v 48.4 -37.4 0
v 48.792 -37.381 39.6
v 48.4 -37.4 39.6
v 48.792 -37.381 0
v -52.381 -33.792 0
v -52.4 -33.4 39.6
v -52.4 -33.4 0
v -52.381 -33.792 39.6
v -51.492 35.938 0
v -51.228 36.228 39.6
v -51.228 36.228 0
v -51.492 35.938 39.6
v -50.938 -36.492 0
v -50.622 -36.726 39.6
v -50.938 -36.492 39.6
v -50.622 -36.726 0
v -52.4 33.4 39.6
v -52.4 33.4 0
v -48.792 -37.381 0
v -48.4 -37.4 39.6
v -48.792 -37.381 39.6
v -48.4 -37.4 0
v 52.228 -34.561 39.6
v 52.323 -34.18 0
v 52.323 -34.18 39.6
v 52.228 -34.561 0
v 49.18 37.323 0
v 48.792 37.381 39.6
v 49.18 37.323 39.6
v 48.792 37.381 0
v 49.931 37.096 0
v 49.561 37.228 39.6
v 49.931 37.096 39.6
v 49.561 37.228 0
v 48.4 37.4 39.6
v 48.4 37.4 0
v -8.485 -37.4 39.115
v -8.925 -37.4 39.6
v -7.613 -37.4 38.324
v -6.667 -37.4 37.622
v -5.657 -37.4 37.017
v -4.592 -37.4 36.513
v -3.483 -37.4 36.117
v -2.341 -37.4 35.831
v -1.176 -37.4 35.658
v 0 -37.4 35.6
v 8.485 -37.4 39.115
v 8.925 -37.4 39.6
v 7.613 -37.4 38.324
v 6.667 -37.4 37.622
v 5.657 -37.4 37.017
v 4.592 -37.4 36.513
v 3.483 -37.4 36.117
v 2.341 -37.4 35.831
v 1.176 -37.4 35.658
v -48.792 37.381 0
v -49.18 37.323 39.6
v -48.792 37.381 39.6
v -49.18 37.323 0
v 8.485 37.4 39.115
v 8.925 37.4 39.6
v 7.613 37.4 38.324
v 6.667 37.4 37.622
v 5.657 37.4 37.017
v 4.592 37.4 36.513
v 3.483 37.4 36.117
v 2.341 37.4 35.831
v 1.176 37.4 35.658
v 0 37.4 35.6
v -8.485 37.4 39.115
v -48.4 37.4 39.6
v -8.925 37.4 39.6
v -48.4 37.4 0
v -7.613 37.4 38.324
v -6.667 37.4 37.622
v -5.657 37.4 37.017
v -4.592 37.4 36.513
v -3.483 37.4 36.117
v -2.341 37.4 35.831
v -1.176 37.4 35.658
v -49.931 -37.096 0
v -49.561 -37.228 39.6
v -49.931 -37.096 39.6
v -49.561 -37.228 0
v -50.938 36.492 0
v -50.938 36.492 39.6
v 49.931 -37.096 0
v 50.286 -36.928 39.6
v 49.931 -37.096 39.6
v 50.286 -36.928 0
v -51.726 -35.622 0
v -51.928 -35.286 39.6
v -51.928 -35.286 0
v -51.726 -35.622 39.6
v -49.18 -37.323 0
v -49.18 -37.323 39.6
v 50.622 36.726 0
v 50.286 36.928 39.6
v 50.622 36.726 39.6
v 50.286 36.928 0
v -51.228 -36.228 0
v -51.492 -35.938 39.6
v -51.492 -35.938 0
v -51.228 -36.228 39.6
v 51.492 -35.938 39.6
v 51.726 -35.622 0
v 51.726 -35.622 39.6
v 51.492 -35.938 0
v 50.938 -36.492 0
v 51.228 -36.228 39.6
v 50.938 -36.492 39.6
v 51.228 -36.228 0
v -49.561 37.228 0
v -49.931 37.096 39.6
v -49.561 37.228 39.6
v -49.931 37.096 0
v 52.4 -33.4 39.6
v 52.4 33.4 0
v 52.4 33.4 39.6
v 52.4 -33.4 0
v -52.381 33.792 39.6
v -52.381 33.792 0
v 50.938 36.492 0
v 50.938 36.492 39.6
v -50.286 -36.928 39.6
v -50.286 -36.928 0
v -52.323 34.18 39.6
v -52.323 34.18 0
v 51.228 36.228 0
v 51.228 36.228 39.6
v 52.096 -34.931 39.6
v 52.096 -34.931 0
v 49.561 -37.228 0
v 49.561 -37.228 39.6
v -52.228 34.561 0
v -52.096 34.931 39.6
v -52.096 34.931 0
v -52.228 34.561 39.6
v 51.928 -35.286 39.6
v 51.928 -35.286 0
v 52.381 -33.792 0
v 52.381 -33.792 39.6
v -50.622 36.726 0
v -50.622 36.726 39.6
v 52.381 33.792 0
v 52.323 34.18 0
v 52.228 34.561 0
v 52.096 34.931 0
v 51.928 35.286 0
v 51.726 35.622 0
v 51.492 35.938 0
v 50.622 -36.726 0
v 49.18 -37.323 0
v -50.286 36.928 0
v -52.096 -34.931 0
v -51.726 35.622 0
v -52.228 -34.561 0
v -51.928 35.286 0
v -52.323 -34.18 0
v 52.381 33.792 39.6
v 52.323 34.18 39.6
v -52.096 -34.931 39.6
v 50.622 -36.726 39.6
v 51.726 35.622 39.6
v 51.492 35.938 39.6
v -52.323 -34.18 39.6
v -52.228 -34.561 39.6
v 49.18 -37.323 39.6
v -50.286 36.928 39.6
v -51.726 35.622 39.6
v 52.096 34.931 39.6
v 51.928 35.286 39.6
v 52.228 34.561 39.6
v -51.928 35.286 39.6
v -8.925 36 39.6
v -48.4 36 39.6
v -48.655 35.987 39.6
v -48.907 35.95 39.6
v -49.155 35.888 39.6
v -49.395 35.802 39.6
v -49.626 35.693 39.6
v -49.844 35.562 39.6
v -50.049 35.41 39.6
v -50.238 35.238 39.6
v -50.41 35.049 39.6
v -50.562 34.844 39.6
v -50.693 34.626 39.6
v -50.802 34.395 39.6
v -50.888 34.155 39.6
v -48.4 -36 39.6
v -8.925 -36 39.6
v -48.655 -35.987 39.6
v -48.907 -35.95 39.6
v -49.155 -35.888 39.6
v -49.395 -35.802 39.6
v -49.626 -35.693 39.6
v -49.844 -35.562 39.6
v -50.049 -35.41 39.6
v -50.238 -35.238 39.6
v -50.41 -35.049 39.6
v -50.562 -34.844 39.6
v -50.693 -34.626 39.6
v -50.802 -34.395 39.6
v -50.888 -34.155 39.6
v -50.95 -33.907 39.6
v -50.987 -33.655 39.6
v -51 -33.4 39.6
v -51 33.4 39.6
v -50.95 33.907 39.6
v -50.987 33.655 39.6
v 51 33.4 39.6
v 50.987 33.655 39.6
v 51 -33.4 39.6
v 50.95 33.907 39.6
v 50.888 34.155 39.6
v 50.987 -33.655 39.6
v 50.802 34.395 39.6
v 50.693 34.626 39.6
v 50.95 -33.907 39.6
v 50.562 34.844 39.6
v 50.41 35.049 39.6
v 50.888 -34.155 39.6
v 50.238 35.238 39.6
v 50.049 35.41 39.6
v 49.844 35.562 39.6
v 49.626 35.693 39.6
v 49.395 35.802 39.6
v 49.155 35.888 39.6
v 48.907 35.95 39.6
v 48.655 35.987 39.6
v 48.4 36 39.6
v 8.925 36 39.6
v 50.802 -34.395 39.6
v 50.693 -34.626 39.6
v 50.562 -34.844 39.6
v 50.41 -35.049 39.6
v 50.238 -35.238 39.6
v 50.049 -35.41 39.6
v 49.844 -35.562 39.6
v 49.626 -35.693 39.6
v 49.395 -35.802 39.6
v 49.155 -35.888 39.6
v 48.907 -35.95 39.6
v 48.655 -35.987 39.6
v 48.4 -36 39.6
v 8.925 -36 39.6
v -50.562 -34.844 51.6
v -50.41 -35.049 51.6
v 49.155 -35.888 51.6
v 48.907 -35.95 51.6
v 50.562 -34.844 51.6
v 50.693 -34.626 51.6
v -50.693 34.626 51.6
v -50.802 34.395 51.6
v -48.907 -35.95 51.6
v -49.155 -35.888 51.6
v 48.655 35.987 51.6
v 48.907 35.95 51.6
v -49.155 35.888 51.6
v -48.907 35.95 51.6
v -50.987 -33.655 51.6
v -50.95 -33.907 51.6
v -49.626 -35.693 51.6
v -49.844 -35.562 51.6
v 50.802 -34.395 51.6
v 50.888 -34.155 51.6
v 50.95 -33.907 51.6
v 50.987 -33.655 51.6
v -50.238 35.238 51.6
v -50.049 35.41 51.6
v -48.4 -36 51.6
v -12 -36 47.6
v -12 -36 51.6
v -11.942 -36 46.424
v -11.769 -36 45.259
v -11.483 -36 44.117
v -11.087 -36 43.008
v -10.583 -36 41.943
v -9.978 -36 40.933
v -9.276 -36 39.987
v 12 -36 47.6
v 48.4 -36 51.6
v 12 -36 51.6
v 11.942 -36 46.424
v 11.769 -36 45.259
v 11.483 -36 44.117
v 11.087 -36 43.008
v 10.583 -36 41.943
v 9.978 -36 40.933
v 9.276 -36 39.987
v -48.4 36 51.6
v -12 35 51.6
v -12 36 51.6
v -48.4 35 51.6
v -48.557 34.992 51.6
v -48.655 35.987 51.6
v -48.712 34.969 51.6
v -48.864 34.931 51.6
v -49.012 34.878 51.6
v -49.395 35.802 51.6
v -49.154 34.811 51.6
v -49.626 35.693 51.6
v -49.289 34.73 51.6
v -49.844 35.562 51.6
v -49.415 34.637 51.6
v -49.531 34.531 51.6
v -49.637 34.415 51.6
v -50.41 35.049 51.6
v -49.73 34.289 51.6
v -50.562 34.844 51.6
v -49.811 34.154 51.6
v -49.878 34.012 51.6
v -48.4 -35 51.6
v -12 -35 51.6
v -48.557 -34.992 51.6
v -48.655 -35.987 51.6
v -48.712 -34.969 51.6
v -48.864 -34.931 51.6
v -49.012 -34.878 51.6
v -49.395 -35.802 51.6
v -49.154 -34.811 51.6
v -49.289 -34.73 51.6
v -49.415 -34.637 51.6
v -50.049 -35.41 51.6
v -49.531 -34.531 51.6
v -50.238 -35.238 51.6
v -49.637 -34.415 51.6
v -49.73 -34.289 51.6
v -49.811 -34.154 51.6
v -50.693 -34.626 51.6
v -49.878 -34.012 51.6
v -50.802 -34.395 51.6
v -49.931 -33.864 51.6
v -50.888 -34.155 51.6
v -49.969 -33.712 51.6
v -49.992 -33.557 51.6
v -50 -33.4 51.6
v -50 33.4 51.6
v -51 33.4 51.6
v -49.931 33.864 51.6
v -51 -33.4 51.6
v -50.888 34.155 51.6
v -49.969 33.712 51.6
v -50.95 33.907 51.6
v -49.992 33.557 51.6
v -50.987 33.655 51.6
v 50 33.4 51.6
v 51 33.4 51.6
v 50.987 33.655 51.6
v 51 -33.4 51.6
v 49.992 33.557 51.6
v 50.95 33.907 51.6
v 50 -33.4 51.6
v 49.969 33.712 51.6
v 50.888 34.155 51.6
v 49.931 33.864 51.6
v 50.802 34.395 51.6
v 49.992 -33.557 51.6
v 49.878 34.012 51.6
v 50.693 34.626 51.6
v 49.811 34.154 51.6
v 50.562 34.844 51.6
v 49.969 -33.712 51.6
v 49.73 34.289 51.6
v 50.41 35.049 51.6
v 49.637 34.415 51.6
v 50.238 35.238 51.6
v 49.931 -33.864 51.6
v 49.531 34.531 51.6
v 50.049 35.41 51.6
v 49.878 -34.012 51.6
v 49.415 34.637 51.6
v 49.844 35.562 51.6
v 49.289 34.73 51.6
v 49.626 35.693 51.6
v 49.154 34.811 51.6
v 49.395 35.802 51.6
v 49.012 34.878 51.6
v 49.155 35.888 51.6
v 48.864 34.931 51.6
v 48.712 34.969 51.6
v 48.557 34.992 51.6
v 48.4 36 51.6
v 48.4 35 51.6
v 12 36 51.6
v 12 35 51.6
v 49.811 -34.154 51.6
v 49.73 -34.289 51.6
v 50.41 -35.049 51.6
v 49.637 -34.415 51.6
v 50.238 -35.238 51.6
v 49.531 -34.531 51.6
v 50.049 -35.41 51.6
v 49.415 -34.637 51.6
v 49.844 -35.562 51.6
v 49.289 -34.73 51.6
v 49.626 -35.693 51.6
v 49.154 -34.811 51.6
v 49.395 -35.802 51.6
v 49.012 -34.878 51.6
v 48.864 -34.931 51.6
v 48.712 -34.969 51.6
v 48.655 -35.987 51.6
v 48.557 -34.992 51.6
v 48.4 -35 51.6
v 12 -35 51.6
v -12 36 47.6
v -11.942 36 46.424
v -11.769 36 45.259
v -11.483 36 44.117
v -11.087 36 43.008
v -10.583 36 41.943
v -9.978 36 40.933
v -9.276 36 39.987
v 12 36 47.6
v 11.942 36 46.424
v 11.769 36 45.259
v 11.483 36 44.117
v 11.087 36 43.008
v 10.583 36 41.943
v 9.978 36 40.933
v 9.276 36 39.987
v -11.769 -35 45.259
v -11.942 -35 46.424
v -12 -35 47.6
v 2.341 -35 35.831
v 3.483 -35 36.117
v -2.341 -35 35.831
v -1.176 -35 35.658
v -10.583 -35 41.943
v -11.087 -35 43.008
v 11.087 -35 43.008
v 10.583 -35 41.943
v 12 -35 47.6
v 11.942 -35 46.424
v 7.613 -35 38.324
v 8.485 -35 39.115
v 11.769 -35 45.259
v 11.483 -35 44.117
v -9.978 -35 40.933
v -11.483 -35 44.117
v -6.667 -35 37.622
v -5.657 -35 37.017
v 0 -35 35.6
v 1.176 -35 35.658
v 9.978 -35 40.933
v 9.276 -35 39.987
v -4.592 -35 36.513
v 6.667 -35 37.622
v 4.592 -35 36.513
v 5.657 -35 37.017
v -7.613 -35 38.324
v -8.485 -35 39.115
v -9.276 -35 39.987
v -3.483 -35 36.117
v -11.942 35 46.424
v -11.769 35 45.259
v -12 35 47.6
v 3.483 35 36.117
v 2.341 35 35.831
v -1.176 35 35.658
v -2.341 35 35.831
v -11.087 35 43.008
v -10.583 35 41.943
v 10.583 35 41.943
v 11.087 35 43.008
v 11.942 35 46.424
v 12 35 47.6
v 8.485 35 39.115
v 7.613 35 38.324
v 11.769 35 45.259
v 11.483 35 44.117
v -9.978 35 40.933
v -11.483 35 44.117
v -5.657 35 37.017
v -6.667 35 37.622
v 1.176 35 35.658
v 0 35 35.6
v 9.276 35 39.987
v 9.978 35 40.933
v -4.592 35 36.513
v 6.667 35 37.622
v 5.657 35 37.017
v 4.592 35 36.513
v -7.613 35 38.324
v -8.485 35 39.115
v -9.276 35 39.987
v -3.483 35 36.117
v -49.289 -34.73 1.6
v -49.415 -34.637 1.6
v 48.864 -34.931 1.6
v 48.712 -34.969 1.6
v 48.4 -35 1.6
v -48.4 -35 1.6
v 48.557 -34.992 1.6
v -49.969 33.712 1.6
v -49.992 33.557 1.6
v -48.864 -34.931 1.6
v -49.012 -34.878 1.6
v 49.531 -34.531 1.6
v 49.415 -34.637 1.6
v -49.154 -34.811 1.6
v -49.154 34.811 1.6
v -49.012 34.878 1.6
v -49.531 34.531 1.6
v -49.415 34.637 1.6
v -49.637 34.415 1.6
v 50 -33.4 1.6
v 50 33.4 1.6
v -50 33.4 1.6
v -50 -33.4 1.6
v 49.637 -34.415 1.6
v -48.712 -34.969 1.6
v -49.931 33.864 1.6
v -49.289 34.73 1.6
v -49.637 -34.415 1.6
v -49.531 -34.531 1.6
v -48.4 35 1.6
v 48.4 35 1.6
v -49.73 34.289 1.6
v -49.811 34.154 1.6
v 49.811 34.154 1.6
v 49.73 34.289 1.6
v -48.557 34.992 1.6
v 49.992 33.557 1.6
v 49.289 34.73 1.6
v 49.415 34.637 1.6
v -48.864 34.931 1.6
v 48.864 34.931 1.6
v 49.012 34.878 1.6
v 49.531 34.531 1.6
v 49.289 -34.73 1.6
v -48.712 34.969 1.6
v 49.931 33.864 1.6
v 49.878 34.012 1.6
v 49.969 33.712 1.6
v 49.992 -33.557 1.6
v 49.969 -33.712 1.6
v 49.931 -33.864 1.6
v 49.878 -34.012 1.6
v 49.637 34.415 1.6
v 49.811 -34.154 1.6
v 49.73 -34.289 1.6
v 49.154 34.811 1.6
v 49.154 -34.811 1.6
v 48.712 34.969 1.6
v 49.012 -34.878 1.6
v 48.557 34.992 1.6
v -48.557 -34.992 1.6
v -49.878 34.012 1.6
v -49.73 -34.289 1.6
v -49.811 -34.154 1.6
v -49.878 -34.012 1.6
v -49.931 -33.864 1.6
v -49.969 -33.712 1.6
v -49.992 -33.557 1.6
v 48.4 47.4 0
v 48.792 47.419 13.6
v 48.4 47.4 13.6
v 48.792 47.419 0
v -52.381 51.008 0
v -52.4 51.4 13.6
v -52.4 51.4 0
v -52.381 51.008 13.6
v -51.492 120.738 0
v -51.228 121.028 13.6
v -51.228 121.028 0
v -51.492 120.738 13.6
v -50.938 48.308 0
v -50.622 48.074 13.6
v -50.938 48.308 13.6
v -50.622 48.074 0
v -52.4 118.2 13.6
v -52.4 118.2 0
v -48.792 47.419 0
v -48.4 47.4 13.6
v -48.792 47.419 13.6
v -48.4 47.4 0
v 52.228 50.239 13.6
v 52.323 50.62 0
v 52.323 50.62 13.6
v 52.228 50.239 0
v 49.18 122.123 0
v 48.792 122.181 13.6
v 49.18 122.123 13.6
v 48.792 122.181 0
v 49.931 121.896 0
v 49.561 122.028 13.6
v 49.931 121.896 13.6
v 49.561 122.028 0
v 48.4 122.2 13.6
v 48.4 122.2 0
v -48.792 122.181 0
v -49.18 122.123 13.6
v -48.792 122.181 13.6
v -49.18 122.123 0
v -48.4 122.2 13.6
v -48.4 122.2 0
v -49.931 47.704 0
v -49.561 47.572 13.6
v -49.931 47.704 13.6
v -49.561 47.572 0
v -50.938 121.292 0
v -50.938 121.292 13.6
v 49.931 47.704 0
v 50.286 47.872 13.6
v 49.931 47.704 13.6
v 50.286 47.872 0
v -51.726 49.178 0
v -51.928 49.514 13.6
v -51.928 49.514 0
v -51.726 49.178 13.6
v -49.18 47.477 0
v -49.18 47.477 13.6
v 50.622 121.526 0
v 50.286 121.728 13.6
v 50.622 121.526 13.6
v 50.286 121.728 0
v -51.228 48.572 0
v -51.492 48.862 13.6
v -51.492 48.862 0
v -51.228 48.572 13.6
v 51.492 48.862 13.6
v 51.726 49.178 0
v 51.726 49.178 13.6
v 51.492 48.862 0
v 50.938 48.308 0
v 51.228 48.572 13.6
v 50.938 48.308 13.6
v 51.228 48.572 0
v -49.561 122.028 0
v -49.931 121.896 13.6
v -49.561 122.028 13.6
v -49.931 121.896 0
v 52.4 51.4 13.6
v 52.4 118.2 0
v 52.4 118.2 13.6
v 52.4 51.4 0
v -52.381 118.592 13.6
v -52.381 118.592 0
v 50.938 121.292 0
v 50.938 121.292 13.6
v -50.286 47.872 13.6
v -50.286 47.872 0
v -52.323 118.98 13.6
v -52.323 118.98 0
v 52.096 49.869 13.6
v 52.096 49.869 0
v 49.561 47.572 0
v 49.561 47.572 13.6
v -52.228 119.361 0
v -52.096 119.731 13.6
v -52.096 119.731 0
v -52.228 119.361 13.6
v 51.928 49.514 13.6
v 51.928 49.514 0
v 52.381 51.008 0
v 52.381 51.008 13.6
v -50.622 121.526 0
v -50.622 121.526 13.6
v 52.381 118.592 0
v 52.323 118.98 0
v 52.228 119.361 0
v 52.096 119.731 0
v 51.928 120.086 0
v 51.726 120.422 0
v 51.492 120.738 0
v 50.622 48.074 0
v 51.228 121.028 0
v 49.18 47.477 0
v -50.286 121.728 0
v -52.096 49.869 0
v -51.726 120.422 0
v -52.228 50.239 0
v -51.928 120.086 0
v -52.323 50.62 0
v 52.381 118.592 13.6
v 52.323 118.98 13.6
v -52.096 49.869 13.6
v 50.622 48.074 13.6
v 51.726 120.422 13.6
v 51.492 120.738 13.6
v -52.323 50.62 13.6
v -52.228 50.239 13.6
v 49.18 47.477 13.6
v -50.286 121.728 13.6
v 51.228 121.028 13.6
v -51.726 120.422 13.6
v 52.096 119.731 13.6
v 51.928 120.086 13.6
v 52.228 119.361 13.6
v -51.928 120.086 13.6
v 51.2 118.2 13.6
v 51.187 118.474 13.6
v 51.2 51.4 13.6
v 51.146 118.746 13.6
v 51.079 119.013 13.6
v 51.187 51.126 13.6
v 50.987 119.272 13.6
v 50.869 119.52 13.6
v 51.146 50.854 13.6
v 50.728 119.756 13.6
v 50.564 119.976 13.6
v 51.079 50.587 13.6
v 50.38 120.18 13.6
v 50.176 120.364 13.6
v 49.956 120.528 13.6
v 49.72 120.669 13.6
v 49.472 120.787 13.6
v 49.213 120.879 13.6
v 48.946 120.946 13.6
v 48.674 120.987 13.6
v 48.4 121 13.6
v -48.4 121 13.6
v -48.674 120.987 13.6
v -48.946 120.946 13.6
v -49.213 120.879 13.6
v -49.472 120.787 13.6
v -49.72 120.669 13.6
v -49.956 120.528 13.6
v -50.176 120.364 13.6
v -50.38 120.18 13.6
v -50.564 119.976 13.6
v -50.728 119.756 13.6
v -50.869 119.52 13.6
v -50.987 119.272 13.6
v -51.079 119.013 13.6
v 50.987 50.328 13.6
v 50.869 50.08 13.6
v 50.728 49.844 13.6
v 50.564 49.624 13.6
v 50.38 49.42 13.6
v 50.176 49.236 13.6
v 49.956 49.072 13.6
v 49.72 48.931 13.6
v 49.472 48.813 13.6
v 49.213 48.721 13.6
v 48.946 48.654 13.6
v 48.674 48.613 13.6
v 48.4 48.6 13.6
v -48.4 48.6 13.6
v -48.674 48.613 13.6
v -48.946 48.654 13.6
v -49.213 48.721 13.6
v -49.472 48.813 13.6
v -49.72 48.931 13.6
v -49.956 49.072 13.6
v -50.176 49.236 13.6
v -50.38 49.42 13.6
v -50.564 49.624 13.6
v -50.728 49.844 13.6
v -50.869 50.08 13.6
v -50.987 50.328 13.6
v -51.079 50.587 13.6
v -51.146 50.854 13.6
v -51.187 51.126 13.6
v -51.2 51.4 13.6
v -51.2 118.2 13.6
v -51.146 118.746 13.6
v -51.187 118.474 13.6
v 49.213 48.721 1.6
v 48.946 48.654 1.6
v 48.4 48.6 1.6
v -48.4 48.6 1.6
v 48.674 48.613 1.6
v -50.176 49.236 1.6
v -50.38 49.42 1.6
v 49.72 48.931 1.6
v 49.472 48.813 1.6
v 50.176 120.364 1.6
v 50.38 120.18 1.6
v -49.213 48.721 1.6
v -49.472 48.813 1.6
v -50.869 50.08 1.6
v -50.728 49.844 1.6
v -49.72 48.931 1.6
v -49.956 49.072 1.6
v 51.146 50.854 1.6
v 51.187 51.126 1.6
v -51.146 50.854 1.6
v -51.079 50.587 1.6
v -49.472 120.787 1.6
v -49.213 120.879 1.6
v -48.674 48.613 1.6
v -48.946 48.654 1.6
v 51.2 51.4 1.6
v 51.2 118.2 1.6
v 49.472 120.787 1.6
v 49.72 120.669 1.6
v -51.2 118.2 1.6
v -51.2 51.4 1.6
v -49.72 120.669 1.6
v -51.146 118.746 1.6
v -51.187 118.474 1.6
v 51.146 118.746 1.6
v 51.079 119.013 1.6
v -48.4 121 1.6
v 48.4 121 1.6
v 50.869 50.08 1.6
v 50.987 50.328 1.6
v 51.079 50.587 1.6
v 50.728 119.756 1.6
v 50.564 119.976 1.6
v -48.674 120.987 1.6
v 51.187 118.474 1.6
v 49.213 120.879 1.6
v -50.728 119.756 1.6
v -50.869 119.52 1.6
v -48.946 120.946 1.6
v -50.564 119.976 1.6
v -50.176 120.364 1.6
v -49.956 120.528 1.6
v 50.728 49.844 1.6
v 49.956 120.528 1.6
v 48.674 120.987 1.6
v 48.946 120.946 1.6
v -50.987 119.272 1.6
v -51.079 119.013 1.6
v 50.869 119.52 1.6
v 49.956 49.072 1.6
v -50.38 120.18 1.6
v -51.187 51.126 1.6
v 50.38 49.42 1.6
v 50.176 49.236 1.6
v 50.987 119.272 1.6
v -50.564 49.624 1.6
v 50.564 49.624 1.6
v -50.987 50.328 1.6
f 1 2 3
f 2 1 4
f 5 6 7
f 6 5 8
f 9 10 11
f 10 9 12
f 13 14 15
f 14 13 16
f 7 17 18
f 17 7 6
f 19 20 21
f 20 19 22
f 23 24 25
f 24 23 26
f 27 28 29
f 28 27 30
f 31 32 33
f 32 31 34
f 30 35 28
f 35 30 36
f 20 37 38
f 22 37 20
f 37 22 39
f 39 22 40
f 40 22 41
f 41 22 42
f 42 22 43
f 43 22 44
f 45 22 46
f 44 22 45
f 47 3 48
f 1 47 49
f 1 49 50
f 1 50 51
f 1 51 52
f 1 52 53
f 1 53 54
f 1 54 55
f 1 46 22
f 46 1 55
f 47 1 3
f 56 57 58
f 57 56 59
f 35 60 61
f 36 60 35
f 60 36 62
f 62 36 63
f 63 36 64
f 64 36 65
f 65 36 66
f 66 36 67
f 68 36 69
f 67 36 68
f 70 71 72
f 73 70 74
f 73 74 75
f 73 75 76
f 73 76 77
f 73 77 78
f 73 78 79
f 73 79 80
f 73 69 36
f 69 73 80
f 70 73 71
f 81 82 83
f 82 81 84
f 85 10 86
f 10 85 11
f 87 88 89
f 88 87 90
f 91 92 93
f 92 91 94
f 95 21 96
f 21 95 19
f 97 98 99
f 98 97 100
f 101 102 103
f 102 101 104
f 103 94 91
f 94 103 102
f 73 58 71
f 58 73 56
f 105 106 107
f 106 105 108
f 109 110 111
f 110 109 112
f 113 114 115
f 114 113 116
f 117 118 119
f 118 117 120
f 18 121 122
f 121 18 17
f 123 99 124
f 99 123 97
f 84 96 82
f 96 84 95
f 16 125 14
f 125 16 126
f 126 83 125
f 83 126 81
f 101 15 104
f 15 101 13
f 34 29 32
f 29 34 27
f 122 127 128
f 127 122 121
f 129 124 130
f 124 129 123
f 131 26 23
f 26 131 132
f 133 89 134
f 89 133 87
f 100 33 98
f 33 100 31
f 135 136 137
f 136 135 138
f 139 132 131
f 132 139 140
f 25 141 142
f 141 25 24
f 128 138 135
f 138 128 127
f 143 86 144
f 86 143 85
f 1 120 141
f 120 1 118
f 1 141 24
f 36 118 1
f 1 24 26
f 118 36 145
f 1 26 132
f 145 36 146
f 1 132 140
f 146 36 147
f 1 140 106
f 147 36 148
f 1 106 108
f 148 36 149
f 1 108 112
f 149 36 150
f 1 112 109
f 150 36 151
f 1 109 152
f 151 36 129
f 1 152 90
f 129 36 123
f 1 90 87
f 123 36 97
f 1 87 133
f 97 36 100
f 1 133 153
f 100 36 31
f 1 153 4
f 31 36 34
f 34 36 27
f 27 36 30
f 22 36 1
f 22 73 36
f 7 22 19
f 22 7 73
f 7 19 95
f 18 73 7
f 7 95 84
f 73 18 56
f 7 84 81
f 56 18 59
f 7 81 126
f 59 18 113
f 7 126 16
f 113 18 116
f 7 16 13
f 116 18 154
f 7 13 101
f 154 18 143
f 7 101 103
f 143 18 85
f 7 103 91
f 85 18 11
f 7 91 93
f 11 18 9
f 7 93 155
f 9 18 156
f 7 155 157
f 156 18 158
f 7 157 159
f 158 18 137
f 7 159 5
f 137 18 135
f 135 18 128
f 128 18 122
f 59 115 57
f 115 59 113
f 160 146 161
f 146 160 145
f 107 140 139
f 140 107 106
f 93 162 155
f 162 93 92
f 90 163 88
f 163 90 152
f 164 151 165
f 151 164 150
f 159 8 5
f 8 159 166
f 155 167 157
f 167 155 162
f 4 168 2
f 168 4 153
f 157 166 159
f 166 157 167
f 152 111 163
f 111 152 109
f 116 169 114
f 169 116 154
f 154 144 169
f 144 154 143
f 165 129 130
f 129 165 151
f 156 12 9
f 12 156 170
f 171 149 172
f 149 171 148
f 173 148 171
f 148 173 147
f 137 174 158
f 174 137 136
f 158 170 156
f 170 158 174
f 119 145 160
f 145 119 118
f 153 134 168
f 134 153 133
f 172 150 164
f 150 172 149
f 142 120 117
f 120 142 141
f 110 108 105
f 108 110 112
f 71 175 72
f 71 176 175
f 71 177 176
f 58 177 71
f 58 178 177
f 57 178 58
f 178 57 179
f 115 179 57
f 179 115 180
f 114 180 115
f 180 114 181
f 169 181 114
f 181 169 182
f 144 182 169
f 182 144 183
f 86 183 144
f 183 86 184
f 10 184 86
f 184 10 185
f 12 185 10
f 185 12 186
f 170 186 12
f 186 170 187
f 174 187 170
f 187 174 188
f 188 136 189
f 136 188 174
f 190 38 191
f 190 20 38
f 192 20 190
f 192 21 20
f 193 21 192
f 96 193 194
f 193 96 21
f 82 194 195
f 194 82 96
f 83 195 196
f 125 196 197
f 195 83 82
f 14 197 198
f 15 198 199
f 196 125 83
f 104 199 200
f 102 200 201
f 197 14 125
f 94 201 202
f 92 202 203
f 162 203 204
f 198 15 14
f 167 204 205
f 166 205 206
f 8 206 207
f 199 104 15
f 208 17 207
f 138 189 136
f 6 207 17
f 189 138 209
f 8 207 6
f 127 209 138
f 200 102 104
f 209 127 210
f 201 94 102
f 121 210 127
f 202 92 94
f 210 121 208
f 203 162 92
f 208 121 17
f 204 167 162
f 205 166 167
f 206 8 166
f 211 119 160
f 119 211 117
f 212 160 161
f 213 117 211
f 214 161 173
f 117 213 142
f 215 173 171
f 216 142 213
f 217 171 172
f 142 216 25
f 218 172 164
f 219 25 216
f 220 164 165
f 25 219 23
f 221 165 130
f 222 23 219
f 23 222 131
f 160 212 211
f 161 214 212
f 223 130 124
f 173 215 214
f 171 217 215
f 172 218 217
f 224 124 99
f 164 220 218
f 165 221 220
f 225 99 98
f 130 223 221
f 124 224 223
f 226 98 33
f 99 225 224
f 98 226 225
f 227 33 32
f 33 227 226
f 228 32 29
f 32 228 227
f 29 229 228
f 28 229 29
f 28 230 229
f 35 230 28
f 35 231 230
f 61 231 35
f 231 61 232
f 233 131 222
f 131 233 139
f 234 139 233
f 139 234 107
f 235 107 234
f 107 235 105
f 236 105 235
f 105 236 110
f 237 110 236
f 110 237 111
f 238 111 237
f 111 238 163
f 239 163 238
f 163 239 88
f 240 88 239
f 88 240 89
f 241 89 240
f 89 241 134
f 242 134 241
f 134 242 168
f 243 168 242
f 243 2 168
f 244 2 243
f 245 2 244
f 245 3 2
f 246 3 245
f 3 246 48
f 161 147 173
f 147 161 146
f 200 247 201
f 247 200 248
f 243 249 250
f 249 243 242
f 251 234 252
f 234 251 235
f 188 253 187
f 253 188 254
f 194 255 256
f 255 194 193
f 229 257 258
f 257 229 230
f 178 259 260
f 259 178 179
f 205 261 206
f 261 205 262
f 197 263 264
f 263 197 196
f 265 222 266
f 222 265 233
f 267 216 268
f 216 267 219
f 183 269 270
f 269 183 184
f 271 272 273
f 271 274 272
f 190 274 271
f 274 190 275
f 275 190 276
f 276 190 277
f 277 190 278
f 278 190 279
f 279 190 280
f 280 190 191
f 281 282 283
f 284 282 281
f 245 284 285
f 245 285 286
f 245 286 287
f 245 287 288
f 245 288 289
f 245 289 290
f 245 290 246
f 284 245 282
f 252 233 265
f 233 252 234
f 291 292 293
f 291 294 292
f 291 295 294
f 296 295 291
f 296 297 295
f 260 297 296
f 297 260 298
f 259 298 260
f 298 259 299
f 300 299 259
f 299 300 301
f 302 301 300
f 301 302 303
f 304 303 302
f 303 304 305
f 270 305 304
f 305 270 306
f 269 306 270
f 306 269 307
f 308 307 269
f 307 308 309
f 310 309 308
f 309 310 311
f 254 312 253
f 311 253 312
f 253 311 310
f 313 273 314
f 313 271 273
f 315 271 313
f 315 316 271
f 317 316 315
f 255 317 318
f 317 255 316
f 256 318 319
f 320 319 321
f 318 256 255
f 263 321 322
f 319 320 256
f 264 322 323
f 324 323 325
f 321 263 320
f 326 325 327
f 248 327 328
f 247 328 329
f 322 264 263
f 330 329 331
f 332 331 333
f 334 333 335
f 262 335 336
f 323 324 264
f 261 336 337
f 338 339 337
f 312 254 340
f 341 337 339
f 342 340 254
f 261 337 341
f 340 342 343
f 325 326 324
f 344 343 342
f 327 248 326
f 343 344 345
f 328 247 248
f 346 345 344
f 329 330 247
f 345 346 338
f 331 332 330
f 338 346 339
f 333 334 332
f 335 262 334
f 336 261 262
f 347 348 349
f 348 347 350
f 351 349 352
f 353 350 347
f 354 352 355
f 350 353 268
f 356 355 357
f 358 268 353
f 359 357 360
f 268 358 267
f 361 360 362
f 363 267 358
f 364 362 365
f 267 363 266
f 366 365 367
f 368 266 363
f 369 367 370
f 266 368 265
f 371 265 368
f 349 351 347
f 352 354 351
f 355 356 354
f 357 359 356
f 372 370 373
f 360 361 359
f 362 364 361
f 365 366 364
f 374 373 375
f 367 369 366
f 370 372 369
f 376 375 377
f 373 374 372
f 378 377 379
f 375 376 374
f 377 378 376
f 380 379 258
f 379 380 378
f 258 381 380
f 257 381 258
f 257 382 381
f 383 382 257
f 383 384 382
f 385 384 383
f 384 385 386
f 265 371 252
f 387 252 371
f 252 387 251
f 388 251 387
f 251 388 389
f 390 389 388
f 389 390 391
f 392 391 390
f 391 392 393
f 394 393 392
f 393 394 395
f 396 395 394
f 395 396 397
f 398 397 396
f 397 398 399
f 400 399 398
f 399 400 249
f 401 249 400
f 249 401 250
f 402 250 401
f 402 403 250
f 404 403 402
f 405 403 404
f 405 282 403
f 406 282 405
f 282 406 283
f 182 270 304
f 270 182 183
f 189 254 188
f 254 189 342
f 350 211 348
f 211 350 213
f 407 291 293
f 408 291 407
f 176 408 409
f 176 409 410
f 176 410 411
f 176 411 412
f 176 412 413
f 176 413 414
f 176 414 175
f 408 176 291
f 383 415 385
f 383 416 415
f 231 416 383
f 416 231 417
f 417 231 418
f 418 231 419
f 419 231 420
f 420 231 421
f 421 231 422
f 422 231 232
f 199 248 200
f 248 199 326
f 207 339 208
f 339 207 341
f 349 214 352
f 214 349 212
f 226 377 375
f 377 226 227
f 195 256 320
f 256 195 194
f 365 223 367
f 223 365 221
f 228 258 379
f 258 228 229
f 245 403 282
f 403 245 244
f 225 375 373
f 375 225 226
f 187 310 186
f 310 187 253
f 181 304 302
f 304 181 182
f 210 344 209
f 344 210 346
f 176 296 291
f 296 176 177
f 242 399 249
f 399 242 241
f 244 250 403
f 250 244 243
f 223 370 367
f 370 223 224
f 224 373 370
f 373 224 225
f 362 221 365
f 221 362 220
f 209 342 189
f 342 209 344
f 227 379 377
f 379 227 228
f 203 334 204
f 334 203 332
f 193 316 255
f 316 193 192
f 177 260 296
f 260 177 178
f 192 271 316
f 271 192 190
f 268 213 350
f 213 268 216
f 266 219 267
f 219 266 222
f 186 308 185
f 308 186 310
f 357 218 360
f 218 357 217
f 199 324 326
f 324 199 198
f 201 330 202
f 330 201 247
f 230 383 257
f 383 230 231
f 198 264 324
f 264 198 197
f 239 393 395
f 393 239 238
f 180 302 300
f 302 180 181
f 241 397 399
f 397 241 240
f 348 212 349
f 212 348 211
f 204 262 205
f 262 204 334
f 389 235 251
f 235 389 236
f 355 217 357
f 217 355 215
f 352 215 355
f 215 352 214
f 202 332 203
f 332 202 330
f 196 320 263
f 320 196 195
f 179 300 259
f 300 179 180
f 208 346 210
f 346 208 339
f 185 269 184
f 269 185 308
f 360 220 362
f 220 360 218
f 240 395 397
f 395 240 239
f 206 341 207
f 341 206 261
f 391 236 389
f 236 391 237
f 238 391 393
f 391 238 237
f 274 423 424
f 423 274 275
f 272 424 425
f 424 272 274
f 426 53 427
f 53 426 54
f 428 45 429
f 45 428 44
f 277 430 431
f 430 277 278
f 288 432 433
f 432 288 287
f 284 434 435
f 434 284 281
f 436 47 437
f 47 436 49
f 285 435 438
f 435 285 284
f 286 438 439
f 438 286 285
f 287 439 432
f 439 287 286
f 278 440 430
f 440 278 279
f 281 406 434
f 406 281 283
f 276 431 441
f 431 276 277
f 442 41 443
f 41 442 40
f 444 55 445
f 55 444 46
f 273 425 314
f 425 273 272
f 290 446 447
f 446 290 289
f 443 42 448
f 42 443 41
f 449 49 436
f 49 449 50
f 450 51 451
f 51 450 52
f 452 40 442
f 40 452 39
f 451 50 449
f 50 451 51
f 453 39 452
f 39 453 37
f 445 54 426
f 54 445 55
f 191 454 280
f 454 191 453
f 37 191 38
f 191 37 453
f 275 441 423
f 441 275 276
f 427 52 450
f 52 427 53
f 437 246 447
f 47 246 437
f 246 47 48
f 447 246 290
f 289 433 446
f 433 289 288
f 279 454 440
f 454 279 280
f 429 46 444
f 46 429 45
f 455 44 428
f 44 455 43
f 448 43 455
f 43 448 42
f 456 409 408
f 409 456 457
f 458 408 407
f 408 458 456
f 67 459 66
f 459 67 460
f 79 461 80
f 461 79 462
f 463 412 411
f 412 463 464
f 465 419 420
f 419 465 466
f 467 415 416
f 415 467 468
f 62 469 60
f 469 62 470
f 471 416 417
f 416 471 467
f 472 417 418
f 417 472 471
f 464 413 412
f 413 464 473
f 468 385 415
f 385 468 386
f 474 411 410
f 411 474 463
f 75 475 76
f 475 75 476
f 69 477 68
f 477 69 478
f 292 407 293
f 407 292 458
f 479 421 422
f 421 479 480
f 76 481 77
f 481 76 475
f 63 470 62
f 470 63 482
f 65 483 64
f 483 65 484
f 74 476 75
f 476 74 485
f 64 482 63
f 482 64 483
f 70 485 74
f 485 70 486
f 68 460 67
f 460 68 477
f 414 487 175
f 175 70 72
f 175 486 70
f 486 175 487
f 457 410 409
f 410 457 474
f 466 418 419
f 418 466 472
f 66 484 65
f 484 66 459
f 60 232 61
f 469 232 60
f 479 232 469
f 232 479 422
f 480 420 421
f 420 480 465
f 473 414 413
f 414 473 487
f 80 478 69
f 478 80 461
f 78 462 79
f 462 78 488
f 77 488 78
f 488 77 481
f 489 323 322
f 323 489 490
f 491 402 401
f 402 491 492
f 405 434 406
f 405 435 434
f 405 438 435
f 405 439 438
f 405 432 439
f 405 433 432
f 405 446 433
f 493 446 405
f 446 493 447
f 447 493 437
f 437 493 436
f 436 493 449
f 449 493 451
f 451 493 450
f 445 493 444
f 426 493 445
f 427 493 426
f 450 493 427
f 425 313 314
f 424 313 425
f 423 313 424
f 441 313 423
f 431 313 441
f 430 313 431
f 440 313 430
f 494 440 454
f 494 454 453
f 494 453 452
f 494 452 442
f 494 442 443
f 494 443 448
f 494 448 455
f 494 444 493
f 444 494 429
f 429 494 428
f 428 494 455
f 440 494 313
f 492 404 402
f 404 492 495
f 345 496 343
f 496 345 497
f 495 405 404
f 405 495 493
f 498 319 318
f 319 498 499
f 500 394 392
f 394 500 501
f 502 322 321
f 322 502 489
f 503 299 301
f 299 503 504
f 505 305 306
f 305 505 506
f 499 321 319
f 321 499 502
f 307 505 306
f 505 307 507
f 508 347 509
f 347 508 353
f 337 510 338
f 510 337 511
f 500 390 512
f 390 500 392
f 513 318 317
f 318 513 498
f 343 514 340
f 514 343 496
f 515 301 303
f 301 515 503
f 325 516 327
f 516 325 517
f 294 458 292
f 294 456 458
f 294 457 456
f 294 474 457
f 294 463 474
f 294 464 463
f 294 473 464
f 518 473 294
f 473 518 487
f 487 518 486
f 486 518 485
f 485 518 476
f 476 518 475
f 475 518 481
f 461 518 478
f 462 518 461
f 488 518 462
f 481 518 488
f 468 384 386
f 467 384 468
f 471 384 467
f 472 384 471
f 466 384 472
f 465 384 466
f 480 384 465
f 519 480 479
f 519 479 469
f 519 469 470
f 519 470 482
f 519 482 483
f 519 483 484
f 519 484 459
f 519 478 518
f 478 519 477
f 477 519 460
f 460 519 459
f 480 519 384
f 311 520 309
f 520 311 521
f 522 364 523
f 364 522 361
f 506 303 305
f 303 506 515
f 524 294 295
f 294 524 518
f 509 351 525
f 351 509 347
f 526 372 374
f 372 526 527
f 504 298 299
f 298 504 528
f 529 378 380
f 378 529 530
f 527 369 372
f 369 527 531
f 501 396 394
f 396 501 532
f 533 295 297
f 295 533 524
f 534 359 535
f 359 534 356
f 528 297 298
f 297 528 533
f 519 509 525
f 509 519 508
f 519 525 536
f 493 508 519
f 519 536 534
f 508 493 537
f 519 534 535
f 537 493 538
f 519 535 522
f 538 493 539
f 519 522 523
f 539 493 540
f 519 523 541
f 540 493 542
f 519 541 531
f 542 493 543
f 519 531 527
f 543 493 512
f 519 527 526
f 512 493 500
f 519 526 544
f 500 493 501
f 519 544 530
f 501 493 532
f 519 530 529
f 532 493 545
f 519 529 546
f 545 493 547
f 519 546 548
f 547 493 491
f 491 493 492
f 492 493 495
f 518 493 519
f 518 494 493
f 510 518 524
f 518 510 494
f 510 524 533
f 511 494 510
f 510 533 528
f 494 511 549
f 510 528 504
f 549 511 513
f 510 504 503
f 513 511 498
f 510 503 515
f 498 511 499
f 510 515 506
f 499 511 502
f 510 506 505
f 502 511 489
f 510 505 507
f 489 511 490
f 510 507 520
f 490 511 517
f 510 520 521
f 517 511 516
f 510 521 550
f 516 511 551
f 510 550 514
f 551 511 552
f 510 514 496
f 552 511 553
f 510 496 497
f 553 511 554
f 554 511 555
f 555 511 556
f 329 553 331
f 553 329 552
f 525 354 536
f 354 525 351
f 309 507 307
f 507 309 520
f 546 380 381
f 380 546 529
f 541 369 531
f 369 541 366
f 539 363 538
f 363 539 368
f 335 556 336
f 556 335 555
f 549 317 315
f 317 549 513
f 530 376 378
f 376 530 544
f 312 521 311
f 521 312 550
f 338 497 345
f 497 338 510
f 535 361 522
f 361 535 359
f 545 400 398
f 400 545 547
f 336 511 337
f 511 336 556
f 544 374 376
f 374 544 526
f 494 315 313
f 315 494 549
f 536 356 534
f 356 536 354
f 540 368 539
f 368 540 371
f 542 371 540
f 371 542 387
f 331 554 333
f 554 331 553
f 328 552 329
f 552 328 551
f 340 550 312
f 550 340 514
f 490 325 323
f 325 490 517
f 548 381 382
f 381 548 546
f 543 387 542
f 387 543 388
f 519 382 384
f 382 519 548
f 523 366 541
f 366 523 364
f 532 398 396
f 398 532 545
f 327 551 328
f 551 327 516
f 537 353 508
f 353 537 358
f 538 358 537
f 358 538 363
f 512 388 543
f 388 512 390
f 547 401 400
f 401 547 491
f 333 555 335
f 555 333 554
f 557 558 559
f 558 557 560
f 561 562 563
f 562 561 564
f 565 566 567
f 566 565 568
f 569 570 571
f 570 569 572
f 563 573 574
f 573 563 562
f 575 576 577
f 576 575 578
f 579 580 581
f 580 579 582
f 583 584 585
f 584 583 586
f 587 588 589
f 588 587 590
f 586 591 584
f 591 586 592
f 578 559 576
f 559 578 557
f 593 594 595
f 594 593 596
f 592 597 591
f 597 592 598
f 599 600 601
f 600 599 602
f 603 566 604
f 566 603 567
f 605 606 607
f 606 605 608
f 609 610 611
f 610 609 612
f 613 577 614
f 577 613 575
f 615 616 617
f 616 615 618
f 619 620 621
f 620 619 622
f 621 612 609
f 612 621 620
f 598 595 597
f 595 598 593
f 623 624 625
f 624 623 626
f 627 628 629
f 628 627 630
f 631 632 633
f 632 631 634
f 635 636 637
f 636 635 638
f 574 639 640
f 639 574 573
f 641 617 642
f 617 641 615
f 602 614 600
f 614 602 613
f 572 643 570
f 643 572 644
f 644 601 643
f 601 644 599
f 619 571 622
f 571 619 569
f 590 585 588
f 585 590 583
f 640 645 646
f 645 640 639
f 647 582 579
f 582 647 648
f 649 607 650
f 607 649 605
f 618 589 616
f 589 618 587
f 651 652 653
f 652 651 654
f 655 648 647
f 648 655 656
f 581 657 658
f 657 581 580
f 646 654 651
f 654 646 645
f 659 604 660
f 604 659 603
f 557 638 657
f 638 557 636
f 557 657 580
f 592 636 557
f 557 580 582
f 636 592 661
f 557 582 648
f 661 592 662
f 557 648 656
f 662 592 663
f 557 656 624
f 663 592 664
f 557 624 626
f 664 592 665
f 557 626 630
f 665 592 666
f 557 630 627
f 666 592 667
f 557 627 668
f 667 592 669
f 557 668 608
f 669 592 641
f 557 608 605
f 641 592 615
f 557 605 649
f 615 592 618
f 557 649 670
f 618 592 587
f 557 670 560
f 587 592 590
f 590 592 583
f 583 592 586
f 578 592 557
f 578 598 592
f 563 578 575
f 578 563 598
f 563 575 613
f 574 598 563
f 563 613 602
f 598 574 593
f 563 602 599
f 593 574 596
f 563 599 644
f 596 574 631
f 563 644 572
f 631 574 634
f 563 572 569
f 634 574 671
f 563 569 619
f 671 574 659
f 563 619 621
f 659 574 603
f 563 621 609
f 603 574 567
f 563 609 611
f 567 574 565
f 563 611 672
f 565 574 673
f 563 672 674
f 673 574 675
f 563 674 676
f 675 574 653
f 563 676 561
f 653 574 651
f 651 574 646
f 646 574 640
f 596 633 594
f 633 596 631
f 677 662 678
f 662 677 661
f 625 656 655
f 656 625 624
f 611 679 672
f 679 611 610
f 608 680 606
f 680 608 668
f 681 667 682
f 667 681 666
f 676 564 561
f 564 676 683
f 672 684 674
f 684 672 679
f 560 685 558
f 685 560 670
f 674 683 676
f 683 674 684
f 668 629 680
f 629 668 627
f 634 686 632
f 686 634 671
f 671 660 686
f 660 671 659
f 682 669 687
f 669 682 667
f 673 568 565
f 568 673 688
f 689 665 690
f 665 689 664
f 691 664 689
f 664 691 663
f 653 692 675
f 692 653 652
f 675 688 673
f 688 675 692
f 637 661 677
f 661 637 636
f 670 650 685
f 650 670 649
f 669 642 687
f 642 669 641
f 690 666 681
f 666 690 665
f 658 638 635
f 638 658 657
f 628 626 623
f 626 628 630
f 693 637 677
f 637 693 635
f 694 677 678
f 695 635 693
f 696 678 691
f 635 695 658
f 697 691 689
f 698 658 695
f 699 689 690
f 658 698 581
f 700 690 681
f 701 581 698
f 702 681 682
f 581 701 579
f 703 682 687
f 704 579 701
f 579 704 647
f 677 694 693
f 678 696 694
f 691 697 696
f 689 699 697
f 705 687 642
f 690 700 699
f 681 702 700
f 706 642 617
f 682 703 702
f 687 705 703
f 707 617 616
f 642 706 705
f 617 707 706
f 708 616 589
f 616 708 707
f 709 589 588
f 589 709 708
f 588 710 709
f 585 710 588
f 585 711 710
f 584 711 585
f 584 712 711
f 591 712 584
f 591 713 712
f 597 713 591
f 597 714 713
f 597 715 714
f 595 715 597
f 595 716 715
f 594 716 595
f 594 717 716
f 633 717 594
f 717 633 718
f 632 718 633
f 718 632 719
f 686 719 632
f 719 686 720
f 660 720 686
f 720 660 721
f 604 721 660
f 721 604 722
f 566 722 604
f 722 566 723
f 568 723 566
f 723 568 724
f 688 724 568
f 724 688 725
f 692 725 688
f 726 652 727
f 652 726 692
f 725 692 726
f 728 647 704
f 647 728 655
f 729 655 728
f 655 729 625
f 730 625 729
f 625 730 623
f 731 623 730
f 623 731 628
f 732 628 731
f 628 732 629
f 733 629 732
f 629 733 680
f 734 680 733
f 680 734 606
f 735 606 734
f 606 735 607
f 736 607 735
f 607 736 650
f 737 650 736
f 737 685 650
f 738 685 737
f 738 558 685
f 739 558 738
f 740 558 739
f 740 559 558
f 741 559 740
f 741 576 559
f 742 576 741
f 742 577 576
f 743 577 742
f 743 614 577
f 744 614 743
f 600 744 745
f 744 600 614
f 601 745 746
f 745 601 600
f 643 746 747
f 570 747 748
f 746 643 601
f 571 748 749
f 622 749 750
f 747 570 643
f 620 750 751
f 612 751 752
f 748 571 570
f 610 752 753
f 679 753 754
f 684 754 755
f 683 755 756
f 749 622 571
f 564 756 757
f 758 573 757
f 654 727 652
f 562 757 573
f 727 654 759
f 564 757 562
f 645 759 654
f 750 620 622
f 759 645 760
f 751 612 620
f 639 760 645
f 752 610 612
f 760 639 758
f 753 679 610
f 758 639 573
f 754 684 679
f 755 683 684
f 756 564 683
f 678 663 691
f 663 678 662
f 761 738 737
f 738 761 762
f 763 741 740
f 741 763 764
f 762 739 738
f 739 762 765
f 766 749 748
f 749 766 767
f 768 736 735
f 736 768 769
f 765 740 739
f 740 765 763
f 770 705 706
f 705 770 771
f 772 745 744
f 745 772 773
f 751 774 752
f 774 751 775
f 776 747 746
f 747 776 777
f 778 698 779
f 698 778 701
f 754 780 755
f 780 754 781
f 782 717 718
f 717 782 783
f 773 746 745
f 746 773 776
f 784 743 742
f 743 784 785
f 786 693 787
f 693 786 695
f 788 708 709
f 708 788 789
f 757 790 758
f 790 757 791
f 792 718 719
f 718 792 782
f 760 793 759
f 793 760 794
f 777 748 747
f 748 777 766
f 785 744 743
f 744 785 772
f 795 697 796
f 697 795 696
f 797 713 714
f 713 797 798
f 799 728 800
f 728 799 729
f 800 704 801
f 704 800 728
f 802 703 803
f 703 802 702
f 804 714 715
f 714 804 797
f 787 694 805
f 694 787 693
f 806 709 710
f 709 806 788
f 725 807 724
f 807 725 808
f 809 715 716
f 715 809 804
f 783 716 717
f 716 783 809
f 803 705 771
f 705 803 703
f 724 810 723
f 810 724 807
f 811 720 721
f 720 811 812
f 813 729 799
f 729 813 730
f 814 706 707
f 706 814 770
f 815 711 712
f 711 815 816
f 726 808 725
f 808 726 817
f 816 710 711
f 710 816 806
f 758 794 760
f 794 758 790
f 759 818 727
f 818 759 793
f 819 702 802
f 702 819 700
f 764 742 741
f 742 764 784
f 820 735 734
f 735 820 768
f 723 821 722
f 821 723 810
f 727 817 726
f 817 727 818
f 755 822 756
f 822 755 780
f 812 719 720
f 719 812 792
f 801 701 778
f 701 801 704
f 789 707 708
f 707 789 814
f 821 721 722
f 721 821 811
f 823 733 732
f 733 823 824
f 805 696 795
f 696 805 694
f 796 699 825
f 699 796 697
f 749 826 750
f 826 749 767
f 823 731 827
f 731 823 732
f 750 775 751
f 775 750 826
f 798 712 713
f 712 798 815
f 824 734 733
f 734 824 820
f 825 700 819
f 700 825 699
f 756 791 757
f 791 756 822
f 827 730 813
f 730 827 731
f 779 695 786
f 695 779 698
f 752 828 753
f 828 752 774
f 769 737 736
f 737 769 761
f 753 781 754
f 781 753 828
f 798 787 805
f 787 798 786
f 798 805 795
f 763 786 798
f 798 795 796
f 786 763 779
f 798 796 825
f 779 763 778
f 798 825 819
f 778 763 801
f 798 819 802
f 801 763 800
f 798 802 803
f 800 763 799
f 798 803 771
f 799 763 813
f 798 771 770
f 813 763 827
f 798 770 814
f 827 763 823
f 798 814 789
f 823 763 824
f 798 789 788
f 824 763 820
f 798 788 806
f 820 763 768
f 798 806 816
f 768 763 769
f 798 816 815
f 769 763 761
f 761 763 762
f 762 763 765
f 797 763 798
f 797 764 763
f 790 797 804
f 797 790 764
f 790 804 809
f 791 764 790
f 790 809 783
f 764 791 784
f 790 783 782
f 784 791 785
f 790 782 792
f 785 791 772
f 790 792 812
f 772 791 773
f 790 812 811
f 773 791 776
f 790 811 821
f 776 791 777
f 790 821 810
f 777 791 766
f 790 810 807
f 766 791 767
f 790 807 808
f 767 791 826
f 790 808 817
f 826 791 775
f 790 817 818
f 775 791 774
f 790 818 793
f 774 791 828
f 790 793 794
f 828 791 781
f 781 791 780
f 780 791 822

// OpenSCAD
// Card Box - a two-piece box for a deck of playing cards.
// Base tray with thumb notches on the long sides, and a lid that slips over a
// thin lip at the top of the base, flush with the base's outer wall when closed.
// Step 1 is the cavity: inner 100 x 70 mm, 50 mm deep (base floor to base rim).
// Both pieces print open side up / lid top down on the bed, no supports.

/* [Cavity (inside dimensions)] */
inner_l = 100;   // [40:1:200] inside length, mm
inner_w = 70;    // [30:1:150] inside width, mm
inner_d = 50;    // [10:1:120] inside depth of the base, mm

/* [Walls] */
wall    = 2.4;   // [1.6:0.4:4] base wall thickness (six 0.4 mm lines)
floor_t = 1.6;   // [1.2:0.2:3] base floor and lid top thickness, mm
corner_r = 4;    // [1:0.5:10] outer corner radius, mm

/* [Lid] */
lip_h  = 12;     // [5:1:30] height of the lip the lid slides over, mm
lid_wall = 1.2;  // [0.8:0.4:2] lid skirt thickness, mm
fit    = 0.2;    // [0:0.05:0.5] radial clearance between lip and lid, mm

/* [Thumb notches] */
notch_w = 24;    // [0:1:50] width of the notch on each long side (0 = none)
notch_d = 16;    // [0:1:40] depth of the notch below the rim

/* [Output] */
part = "assembly"; // [assembly, base, lid, closed, none]

/* [Hidden] */
$fn = 64;
eps = 0.01;
outer_l = inner_l + 2*wall;
outer_w = inner_w + 2*wall;
base_h  = floor_t + inner_d;
lip_t   = wall - lid_wall - fit;      // thickness left in the lip
lid_h   = floor_t + lip_h;
gap     = 10;                         // spacing between pieces on the plate
assert(lip_t >= 0.8, "wall too thin for lid_wall + fit: lip under 0.8 mm");
assert(notch_d < inner_d - 2, "notch deeper than the box");

// rounded rectangle, centred, outer size l x w, corner radius r
module rrect(l, w, r) {
    rr = max(min(r, l/2 - eps, w/2 - eps), eps);
    offset(r = rr) square([l - 2*rr, w - 2*rr], center = true);
}
module rbox(l, w, h, r) linear_extrude(h) rrect(l, w, r);

// Step 2: the base
module base() {
    difference() {
        union() {
            // full-thickness wall below the lip
            rbox(outer_l, outer_w, base_h - lip_h, corner_r);
            // thin lip (the lid skirt + fit takes the rest of the wall)
            rbox(outer_l - 2*(lid_wall + fit), outer_w - 2*(lid_wall + fit),
                 base_h, corner_r - lid_wall - fit);
        }
        // cavity
        translate([0, 0, floor_t])
            rbox(inner_l, inner_w, base_h, corner_r - wall);
        // thumb notches: U shape cut from the rim on both long sides
        if (notch_w > 0 && notch_d > 0)
            for (s = [-1, 1])
                translate([0, s*outer_w/2, base_h - notch_d + notch_w/2])
                    rotate([90, 0, 0]) hull() {
                        cylinder(r = notch_w/2, h = 2*wall + 2, center = true);
                        translate([0, notch_d, 0])
                            cube([notch_w, eps, 2*wall + 2], center = true);
                    }
    }
}

// Step 3: the lid, modelled top-down on the bed (open side up)
module lid() {
    difference() {
        rbox(outer_l, outer_w, lid_h, corner_r);
        translate([0, 0, floor_t])
            rbox(outer_l - 2*lid_wall, outer_w - 2*lid_wall, lid_h,
                 corner_r - lid_wall);
    }
}

echo(str("Card Box: inside ", inner_l, " x ", inner_w, " x ", inner_d,
         " mm; outside ", outer_l, " x ", outer_w, " x ",
         base_h + floor_t, " mm closed; base ", base_h, " mm, lid ", lid_h,
         " mm; lip ", lip_t, " mm thick x ", lip_h, " mm"));

if (part == "base" || part == "assembly")
    color("#C12E1F") base();
if (part == "lid" || part == "assembly")
    color("#C12E1F") translate([0, outer_w + gap, 0]) lid();
if (part == "closed") {
    color("#C12E1F") base();
    color("#C12E1F", 0.6)
        translate([0, 0, base_h + floor_t]) mirror([0, 0, 1]) lid();
}
